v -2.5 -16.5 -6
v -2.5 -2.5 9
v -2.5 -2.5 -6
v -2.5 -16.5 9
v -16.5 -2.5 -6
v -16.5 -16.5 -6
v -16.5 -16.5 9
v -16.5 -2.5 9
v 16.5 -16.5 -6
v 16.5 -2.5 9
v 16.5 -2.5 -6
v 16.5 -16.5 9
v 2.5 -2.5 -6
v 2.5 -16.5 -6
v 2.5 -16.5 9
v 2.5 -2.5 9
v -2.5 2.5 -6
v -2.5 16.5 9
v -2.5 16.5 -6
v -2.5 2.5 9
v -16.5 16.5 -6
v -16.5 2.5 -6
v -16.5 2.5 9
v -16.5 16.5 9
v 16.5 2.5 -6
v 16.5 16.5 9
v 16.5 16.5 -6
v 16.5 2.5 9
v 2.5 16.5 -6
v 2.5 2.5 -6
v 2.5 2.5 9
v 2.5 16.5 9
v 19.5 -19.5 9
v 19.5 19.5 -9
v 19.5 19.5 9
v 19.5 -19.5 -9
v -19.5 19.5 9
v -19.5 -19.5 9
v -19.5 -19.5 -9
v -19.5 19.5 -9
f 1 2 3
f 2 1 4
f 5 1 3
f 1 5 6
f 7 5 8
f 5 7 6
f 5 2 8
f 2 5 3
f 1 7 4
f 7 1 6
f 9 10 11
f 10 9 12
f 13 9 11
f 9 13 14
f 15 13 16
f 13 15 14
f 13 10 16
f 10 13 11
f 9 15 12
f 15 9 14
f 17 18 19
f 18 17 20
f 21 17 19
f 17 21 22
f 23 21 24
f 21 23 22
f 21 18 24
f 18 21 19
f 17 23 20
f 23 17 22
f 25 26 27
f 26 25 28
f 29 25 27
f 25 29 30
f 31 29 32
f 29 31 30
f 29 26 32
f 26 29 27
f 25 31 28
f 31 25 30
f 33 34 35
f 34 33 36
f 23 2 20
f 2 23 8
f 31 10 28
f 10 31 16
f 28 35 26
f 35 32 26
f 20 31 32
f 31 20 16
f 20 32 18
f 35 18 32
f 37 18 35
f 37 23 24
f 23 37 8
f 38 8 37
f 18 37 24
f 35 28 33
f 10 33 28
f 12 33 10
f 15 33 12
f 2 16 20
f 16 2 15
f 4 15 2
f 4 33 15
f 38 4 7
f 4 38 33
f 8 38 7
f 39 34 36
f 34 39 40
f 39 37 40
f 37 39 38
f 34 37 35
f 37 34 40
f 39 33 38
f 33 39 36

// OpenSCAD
$fn = 32;

// ----------------------------------------------------------------------
// Pocket plate 39 x 39 x 18
// 2 x 2 pockets 14 mm square, 15 mm deep
// ----------------------------------------------------------------------

// --- parameters (mm) ---
thickness = 18;  // plate thickness
seat_tol = 0.1;  // tolerance at the seating features
free_tol = 0.3;  // general tolerance on the free sizes
floor_t = 3;     // material left under each pocket
pocket = 14;     // pocket side length
pitch_x = 19;    // pocket pitch along X
pitch_y = 19;    // pocket pitch along Y
cols = 2;        // pockets per row
rows = 2;        // rows of pockets

// --- derived feature positions (mm) ---
depth = thickness - floor_t;        // = 15   pocket depth, down to the floor
span_x = (cols - 1) * pitch_x;      // = 19   distance between outer pockets
span_y = (rows - 1) * pitch_y;      // = 19   distance between outer pocket rows
origin_x = -span_x / 2;             // = -9.5   X of the first pocket
origin_y = -span_y / 2;             // = -9.5   Y of the first pocket
plate = [span_x + pocket + 6, span_y + pocket + 6, thickness];  // = [39, 39, 18]   overall size: pockets plus 3 mm of wall on each side
feature_centers = [
  [origin_x + 0 * pitch_x, origin_y + 0 * pitch_y],
  [origin_x + 1 * pitch_x, origin_y + 0 * pitch_y],
  [origin_x + 0 * pitch_x, origin_y + 1 * pitch_y],
  [origin_x + 1 * pitch_x, origin_y + 1 * pitch_y]
];   // pocket centres, used verbatim by the cutter loop

// plate outline, then one pocket per centre in feature_centers
difference() {
  cube(plate, center = true);
  for (centre = feature_centers)
    translate([centre[0] - pocket / 2, centre[1] - pocket / 2, plate[2] / 2 - depth])
      cube([pocket, pocket, depth + 1]);  // centred on the declared pocket centre
}
